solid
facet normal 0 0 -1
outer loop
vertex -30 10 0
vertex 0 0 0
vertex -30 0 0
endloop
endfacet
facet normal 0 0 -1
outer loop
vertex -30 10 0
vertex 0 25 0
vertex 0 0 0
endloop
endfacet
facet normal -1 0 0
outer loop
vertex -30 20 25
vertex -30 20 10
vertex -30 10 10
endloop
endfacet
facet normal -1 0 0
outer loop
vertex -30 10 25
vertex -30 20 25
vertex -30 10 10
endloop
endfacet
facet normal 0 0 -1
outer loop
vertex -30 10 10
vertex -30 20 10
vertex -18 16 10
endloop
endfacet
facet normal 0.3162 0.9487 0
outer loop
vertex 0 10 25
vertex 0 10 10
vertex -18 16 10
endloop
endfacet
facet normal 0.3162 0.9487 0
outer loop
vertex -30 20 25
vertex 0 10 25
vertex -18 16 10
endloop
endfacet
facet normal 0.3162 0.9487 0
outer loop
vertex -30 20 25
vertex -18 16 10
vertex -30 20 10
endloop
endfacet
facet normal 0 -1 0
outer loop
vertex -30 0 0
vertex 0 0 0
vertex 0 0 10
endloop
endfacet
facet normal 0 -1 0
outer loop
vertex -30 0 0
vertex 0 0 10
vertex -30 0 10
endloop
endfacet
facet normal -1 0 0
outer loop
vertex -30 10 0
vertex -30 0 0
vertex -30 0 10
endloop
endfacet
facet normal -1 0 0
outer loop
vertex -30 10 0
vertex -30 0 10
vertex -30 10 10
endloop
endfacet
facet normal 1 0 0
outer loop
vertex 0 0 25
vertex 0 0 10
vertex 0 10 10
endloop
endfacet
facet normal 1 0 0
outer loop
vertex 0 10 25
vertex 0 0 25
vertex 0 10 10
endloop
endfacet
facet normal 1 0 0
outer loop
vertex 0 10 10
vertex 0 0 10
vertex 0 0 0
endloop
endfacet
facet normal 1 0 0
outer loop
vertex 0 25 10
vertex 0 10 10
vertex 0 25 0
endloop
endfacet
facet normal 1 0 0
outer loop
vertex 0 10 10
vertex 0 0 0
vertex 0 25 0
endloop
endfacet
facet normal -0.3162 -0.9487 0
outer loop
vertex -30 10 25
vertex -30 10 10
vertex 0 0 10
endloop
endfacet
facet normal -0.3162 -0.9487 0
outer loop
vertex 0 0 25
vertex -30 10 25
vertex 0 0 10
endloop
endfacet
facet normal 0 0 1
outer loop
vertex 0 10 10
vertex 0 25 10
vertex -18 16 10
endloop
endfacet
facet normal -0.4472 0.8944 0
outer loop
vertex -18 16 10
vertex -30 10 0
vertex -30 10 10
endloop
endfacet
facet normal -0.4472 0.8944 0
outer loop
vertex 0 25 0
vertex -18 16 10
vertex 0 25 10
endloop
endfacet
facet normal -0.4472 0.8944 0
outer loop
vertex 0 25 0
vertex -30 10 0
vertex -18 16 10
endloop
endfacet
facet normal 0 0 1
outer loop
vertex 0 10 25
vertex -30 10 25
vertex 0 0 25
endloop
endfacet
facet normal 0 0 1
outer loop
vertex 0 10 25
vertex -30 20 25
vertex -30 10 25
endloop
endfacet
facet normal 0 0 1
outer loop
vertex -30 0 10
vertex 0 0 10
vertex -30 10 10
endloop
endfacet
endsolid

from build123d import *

# Parameters (mm, degrees)
BOSS_EXTRUDE1_DEPTH = 10
BOSS_EXTRUDE4_DEPTH = 15


with BuildPart() as part:
    # Sketch1 → Boss-Extrude1 (new body)
    with BuildSketch(Plane.XY):
        Polygon((0, 0), (-30, 0), (-30, 10), (0, 25), align=None)
    extrude(amount=BOSS_EXTRUDE1_DEPTH)

    # Sketch2 → Boss-Extrude4 (add)
    with BuildSketch(Plane.XY.offset(10)):
        Polygon((-30, 10), (0, 0), (0, 10), (-30, 20), align=None)
    extrude(amount=BOSS_EXTRUDE4_DEPTH)


solid = part.part
